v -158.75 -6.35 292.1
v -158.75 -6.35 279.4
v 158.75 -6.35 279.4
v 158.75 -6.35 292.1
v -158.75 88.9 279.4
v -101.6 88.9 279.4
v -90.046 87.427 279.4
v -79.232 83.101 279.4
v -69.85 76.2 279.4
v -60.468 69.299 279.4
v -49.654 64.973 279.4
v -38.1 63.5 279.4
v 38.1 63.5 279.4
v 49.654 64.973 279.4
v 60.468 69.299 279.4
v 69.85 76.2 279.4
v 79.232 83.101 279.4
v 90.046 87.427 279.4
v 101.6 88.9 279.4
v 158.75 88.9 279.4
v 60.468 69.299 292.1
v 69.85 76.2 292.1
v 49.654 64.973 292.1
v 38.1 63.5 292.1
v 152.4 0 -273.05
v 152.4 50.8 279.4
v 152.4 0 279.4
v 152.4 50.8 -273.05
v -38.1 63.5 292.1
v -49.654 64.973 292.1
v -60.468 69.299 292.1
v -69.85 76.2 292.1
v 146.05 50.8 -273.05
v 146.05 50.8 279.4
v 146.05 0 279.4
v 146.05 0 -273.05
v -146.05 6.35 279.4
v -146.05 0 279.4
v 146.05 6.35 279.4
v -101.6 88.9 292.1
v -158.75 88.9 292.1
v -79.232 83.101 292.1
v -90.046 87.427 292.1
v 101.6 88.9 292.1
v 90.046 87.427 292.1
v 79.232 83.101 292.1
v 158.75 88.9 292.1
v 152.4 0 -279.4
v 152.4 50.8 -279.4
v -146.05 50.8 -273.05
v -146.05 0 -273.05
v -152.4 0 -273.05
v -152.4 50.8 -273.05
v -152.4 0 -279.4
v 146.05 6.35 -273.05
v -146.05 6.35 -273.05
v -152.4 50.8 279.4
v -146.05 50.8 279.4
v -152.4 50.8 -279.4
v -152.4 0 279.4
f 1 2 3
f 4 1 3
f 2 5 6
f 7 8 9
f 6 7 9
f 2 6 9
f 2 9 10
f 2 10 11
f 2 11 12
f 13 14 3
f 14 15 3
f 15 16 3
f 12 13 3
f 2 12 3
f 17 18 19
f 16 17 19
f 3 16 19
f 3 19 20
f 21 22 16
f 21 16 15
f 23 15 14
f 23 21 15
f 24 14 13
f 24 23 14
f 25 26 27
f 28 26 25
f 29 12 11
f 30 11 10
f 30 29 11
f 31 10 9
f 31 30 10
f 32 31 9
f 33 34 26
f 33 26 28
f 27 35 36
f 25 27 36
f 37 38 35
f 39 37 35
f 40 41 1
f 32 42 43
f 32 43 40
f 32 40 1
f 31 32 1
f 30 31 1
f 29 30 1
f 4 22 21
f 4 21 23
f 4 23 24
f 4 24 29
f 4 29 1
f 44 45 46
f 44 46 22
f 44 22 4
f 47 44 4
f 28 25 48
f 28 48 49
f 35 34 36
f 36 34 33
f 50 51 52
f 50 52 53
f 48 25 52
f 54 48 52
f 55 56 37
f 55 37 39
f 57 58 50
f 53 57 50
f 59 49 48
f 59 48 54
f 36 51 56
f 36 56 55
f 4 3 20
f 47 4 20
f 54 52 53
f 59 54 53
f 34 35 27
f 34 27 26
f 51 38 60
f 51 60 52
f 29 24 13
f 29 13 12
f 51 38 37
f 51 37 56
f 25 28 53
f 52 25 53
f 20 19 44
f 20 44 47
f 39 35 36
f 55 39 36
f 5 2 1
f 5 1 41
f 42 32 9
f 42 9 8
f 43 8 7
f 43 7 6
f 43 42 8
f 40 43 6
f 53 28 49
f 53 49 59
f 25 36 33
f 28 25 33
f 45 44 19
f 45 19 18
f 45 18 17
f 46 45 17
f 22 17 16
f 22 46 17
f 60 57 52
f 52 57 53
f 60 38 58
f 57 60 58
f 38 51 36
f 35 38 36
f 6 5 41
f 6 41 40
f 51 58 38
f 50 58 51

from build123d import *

# Parameters (mm, degrees)
SKETCH1_W           = 292.1
SKETCH1_H           = 552.45
BOSS_EXTRUDE1_DEPTH = 6.35
SKETCH2_W           = 317.5
SKETCH2_H           = 95.25
BOSS_EXTRUDE2_DEPTH = 12.7
CUT_EXTRUDE1_DEPTH  = 594.716510634
SKETCH4_W           = 552.45
SKETCH4_H           = 50.8
BOSS_EXTRUDE3_DEPTH = 6.35
SKETCH5_W           = 304.8
SKETCH5_H           = 50.8
BOSS_EXTRUDE4_DEPTH = 6.35


with BuildPart() as part:
    # Sketch1 → Boss-Extrude1 (new body)
    with BuildSketch(Plane(origin=(0, 0, 0), x_dir=(1, 0, 0), z_dir=(0, 1, 0))):
        with Locations((0, -3.175)):
            Rectangle(SKETCH1_W, SKETCH1_H)
    extrude(amount=BOSS_EXTRUDE1_DEPTH)


with BuildPart() as body_2:
    # Sketch2 → Boss-Extrude2 (new body)
    with BuildSketch(Plane.XY.offset(279.4)):
        with Locations((0, 41.275)):
            Rectangle(SKETCH2_W, SKETCH2_H)
    extrude(amount=BOSS_EXTRUDE2_DEPTH)

    # Sketch3 → Cut-Extrude1 (cut, through all)
    with BuildSketch(Plane.XY.offset(292.1)):
        with BuildLine():
            Line((-101.6, 101.6), (101.6, 101.6))
            Line((101.6, 101.6), (101.6, 88.9))
            ThreePointArc((101.6, 88.9), (84.502101737, 85.607245657), (69.85, 76.2))
            ThreePointArc((69.85, 76.2), (55.197898263, 66.792754343), (38.1, 63.5))
            Line((38.1, 63.5), (-38.1, 63.5))
            ThreePointArc((-38.1, 63.5), (-55.197898263, 66.792754343), (-69.85, 76.2))
            ThreePointArc((-69.85, 76.2), (-84.502101737, 85.607245657), (-101.6, 88.9))
            Line((-101.6, 88.9), (-101.6, 101.6))
        make_face()
    extrude(amount=-CUT_EXTRUDE1_DEPTH, mode=Mode.SUBTRACT)


with BuildPart() as body_3:
    # Sketch4 → Boss-Extrude3 (new body)
    with BuildSketch(Plane(origin=(146.05, 0, 0), x_dir=(0, 0, -1), z_dir=(1, 0, 0))):
        with Locations((-3.175, 25.4)):
            Rectangle(SKETCH4_W, SKETCH4_H)
    extrude(amount=BOSS_EXTRUDE3_DEPTH)


with BuildPart() as body_4:
    # Mirror2: mirrored copy
    add(body_3.part.mirror(Plane(origin=(0, 0, 0), x_dir=(0, 0, 1), z_dir=(1, 0, 0))))


with BuildPart() as body_5:
    # Sketch5 → Boss-Extrude4 (new body)
    with BuildSketch(Plane(origin=(0, 0, -273.05), x_dir=(-1, 0, 0), z_dir=(0, 0, -1))):
        with Locations((0, 25.4)):
            Rectangle(SKETCH5_W, SKETCH5_H)
    extrude(amount=BOSS_EXTRUDE4_DEPTH)


solid = Compound([part.part, body_2.part, body_3.part, body_4.part, body_5.part])
